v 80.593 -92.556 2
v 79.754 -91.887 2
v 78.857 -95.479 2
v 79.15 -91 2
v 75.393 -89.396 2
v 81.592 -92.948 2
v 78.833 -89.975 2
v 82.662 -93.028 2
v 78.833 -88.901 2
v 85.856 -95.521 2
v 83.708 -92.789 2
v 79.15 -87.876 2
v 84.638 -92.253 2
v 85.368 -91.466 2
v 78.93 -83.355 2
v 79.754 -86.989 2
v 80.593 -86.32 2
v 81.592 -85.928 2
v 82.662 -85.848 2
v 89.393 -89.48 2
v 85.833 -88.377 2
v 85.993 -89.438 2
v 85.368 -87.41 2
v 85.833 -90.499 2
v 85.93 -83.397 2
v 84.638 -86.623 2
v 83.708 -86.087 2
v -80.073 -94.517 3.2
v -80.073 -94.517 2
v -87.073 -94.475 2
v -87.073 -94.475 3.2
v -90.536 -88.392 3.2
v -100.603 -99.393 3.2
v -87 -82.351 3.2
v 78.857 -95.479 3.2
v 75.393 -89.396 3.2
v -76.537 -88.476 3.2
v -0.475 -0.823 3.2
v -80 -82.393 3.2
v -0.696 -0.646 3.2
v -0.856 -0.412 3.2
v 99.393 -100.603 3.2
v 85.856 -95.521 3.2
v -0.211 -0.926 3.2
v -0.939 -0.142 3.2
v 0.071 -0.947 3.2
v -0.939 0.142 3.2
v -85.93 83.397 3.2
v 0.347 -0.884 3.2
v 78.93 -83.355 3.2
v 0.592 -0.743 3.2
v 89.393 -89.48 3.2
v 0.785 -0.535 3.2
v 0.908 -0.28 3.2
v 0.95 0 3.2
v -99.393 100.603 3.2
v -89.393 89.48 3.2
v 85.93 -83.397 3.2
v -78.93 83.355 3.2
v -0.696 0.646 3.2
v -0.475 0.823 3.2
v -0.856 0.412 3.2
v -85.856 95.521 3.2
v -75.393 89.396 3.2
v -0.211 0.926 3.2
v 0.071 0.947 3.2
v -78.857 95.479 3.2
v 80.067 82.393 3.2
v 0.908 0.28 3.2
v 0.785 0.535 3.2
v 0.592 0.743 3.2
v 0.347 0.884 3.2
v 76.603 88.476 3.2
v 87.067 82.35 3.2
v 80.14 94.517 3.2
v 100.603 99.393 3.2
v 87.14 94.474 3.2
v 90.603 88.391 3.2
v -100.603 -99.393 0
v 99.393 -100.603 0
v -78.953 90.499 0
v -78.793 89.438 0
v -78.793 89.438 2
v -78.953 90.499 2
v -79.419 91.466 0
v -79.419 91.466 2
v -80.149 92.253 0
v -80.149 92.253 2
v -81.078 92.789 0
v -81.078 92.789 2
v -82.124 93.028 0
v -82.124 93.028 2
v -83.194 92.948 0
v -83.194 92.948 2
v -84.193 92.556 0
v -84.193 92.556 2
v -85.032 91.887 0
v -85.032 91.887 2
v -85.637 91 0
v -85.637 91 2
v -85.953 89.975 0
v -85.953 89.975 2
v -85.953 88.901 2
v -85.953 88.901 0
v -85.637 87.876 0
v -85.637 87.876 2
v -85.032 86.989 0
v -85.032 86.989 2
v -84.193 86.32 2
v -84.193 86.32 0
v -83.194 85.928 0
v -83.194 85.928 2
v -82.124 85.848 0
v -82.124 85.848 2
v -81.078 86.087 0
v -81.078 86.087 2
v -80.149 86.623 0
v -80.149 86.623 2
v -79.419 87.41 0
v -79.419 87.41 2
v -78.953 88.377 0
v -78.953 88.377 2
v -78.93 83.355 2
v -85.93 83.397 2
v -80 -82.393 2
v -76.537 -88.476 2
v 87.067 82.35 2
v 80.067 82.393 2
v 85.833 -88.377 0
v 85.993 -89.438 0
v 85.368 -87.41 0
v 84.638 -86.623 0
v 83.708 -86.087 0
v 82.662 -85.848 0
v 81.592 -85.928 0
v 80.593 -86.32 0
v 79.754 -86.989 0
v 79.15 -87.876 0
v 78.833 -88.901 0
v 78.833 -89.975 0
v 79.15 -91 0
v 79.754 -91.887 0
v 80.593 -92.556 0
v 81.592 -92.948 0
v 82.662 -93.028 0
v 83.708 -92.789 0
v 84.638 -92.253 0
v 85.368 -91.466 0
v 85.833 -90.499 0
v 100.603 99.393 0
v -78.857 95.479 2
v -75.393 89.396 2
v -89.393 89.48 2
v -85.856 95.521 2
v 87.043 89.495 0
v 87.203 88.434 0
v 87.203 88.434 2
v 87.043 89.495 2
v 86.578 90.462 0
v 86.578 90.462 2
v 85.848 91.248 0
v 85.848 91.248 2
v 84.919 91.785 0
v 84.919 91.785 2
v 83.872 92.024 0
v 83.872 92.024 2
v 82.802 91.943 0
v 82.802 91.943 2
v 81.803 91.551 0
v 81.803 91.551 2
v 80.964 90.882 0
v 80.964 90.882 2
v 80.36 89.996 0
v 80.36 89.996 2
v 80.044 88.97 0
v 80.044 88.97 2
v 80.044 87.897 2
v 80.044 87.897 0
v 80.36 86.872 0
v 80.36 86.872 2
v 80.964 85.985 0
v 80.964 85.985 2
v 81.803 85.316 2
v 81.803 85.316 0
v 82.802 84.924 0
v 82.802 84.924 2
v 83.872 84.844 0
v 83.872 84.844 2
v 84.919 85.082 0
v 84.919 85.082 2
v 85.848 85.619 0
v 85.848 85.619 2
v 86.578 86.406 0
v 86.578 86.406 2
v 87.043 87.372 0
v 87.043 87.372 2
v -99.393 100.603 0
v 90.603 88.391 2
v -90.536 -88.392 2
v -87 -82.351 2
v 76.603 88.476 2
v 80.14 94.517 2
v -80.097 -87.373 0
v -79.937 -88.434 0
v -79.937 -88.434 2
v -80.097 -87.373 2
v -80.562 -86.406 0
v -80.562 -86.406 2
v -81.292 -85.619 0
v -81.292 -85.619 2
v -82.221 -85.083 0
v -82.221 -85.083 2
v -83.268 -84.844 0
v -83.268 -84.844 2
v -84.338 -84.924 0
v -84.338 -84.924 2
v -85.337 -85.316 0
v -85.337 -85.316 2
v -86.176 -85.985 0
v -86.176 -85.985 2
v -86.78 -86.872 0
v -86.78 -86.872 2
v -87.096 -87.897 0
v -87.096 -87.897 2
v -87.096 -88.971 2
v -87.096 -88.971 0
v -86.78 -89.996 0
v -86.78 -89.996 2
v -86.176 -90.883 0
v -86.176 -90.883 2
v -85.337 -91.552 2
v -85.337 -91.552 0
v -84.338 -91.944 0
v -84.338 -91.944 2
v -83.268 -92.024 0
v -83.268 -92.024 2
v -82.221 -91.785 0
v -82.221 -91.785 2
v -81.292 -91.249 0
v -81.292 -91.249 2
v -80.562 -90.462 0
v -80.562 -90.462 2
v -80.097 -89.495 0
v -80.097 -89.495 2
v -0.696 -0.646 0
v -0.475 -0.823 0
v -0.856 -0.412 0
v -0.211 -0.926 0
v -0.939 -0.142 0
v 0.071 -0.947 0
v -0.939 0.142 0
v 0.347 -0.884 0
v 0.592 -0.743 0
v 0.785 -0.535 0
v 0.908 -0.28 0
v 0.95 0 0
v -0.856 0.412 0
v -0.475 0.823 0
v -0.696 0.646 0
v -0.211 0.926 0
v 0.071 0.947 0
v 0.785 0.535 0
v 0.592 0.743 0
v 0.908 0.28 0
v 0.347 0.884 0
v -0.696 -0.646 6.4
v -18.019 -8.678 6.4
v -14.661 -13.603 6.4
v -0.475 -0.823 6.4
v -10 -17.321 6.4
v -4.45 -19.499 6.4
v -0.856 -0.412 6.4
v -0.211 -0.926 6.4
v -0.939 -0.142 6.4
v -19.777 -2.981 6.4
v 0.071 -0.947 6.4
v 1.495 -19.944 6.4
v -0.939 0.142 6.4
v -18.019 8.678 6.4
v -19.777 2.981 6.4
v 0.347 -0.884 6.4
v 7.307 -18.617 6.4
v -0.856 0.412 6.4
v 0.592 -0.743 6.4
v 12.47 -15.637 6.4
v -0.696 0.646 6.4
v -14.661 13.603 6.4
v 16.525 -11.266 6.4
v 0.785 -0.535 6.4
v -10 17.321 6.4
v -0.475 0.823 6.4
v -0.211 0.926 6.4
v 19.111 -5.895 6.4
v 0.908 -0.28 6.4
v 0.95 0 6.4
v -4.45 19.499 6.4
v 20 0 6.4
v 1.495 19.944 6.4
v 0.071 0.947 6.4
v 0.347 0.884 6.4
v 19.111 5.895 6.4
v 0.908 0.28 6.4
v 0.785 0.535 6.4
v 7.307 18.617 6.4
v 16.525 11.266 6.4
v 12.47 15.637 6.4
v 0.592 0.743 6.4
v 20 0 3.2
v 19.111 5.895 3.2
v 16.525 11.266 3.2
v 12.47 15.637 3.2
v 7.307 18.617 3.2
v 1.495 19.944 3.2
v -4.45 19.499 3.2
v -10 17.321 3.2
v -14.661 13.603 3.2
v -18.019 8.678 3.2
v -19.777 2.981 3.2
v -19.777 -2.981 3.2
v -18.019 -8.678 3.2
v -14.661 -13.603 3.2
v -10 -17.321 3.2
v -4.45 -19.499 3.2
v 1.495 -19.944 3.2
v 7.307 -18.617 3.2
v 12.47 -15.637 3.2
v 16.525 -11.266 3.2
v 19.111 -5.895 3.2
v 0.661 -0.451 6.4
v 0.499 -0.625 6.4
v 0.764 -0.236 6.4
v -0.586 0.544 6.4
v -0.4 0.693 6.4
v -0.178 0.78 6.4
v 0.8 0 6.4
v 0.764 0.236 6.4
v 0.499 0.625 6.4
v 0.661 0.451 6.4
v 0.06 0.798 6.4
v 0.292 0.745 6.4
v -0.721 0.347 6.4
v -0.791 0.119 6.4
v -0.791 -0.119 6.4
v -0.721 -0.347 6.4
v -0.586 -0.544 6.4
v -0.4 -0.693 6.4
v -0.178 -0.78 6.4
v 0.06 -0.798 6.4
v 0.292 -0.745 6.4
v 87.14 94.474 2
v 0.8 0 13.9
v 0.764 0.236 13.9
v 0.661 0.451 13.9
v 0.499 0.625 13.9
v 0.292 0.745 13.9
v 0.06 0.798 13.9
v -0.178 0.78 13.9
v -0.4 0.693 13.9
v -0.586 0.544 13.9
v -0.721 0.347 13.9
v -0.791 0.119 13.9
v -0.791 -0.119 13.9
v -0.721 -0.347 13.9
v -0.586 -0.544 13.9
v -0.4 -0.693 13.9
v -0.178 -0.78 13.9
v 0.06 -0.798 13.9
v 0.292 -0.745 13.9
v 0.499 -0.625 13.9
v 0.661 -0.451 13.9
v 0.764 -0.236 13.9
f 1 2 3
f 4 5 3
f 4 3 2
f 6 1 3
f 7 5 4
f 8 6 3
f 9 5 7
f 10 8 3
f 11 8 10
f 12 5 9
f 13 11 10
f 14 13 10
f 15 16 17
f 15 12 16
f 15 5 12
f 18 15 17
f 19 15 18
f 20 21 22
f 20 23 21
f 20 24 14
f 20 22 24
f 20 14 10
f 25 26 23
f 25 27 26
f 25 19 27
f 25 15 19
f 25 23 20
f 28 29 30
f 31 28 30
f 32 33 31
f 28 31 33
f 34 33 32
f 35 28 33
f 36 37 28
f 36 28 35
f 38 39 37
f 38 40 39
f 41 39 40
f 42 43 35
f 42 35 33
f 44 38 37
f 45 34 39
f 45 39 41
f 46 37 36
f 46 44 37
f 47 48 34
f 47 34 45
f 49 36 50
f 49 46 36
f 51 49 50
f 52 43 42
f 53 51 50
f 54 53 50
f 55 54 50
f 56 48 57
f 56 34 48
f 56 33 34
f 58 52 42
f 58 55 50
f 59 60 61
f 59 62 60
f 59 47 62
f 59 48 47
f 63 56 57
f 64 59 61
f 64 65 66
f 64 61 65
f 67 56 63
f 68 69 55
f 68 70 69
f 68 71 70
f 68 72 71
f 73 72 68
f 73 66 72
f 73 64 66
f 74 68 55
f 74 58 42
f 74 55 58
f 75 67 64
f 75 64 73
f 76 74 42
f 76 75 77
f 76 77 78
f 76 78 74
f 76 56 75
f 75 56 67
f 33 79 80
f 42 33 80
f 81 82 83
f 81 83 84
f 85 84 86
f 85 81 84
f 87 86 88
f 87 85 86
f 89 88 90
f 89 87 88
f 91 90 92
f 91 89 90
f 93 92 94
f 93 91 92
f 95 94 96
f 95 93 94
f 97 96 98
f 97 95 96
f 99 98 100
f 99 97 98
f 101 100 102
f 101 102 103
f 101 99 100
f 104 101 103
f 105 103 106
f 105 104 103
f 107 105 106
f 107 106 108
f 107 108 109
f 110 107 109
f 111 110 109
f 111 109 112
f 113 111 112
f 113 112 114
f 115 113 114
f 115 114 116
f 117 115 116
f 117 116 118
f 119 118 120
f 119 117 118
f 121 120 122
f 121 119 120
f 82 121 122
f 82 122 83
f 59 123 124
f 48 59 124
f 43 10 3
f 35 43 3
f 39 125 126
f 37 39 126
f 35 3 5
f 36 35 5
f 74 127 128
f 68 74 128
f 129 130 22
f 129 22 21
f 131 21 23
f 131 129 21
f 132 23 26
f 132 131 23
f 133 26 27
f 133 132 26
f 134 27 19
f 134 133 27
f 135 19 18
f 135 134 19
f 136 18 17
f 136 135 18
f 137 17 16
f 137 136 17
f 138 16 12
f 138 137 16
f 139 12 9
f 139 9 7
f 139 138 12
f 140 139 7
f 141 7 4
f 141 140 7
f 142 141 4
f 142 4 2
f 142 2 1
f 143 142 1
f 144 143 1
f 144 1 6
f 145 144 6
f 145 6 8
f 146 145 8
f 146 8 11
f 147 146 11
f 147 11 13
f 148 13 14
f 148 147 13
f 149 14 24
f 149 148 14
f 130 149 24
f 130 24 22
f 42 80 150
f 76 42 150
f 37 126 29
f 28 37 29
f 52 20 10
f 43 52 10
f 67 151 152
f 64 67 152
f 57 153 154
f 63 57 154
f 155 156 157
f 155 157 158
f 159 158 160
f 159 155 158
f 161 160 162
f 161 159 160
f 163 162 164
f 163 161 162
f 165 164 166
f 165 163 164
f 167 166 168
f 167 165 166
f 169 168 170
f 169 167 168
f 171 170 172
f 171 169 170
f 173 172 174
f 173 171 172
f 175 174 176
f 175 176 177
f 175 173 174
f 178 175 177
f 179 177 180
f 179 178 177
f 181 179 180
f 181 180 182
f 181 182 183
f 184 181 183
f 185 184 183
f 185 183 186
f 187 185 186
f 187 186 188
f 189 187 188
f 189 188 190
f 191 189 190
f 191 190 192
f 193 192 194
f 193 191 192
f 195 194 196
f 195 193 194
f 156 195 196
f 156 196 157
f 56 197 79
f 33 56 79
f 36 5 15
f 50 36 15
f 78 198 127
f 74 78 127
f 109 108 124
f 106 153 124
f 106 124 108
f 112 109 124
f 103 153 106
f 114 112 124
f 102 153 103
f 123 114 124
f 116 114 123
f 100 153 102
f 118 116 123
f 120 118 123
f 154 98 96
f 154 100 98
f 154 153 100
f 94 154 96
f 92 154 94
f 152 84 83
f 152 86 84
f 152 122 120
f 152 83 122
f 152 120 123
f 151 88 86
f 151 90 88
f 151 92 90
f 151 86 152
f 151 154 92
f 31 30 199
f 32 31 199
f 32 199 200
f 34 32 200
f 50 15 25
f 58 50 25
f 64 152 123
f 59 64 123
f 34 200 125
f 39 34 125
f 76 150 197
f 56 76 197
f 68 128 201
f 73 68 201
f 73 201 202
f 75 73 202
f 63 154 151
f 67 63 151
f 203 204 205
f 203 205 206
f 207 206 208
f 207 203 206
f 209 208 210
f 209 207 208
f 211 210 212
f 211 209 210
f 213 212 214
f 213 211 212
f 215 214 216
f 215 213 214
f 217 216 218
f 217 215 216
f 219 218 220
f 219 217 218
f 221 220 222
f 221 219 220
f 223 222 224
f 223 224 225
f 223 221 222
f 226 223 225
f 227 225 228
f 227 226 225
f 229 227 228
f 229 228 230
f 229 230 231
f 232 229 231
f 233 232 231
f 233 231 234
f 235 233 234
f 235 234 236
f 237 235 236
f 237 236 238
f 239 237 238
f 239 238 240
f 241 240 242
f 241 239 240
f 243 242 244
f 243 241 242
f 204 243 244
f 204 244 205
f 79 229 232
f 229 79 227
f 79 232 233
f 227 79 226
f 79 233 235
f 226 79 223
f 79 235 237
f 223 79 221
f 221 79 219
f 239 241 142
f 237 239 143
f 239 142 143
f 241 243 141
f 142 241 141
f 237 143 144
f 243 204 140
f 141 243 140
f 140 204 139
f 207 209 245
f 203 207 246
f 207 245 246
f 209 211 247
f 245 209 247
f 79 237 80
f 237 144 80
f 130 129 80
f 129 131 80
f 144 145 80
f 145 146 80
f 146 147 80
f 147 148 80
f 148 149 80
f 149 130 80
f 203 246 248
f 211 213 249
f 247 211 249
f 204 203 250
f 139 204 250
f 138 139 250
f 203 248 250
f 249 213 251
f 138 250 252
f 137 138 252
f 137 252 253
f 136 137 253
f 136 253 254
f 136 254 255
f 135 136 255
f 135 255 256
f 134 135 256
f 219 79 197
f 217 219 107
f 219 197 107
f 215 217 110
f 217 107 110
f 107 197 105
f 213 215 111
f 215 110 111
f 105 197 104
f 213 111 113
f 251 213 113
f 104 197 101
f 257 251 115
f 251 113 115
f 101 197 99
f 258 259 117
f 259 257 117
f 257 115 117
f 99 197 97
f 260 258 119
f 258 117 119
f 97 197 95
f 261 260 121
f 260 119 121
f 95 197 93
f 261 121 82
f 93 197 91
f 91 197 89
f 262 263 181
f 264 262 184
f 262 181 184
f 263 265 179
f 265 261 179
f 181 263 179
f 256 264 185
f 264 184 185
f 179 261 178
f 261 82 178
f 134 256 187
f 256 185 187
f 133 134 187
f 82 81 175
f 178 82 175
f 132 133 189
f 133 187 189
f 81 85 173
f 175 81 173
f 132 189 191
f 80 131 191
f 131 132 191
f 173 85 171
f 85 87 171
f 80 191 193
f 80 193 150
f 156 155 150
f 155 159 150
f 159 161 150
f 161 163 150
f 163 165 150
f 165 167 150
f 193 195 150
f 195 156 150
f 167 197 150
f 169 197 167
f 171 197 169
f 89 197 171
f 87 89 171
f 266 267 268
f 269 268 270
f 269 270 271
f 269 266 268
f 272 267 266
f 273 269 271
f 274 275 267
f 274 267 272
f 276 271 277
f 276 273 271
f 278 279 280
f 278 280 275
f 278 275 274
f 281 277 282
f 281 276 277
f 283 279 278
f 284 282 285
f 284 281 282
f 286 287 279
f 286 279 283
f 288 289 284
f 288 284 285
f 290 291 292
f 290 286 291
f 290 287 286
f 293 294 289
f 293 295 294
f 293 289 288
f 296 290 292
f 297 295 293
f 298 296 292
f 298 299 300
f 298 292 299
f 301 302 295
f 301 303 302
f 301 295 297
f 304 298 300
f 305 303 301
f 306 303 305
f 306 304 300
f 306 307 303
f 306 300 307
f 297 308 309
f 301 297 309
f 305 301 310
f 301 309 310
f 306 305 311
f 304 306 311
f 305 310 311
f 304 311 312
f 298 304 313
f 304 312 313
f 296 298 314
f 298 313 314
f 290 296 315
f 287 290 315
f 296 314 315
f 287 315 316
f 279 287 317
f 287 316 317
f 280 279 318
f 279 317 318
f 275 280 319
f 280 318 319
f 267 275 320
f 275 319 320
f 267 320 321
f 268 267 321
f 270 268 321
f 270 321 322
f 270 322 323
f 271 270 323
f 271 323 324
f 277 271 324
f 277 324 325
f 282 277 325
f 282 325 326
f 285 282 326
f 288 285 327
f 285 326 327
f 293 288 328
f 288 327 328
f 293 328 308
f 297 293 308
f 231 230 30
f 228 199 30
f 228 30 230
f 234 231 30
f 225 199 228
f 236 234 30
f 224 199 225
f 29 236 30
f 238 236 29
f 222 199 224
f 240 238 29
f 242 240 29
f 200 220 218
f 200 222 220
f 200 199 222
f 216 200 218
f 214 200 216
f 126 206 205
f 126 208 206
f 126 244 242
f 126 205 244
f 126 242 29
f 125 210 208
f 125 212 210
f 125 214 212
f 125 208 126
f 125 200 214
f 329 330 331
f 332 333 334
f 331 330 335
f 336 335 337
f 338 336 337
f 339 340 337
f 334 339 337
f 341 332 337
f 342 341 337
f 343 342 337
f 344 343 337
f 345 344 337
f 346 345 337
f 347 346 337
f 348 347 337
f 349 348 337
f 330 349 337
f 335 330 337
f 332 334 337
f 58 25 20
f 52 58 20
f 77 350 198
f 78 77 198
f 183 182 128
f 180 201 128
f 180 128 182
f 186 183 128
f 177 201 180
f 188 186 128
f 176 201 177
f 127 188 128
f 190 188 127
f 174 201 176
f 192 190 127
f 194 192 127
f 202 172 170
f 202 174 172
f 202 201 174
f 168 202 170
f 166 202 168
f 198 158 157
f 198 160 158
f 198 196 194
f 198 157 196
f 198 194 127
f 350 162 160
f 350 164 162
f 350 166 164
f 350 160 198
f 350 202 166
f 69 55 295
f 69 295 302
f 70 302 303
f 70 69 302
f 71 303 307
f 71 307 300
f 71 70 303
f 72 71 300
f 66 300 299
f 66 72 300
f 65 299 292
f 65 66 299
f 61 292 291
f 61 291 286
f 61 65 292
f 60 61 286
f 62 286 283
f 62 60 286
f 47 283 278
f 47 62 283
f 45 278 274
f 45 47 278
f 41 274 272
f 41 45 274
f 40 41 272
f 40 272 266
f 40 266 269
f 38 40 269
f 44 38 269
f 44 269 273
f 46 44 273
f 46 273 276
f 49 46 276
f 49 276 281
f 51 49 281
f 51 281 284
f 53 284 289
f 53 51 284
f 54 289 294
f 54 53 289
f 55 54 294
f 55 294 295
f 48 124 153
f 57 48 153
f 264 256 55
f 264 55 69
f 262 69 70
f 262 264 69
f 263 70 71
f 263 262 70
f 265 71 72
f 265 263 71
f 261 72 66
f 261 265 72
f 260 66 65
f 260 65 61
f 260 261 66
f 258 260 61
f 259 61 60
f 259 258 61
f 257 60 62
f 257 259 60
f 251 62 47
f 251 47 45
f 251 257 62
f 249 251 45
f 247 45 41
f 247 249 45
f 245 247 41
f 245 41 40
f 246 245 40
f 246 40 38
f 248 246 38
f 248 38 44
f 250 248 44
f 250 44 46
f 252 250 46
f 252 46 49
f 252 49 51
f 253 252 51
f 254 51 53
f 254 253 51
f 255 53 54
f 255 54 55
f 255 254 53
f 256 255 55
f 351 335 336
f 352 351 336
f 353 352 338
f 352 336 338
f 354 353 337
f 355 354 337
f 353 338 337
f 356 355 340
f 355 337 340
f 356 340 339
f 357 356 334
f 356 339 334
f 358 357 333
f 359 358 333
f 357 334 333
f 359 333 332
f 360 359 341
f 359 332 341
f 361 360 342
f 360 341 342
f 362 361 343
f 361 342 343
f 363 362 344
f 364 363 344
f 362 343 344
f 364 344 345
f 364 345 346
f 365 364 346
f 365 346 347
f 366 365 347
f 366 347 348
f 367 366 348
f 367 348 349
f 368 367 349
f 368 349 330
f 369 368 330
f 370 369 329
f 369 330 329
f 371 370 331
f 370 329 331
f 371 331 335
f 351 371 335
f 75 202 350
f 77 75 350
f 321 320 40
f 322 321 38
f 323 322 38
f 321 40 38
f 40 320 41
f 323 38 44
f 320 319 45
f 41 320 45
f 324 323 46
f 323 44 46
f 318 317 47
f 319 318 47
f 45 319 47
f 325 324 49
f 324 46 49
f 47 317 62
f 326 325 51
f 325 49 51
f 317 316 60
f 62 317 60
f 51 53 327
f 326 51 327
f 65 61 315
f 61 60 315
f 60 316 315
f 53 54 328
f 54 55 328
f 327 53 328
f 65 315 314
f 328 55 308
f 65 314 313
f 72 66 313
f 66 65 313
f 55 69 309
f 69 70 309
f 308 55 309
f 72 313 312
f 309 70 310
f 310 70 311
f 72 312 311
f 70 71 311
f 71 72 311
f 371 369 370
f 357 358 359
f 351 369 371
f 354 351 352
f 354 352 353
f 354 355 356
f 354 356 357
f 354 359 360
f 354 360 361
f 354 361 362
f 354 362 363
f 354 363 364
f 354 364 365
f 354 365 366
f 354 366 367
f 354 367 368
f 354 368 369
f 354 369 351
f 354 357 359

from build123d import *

# Parameters (mm, degrees)
F0_R     = 0.95
F1_DEPTH = 3.2
F0_R_2   = 3.6
F2_DEPTH = 2
F3_R     = 20
F3_R_2   = 0.95
F4_DEPTH = 3.2
F5_R     = 0.8
F6_DEPTH = 7.5


with BuildPart() as f1:
    # F0 (on Top) → F1 (new body)
    with BuildSketch(Plane.XY):
        Polygon((100.603239, 99.3931), (-99.3931, 100.603239), (-100.603239, -99.3931), (99.3931, -100.603239), align=None)
        Polygon((-87.073233, -94.474876), (-90.536488, -88.391632), (-86.999872, -82.350742), (-80, -82.393097), (-76.536744, -88.476341), (-80.073361, -94.517231), align=None, mode=Mode.SUBTRACT)
        Circle(F0_R, mode=Mode.SUBTRACT)
        Polygon((85.929844, -83.397106), (89.3931, -89.480351), (85.856484, -95.52124), (78.856612, -95.478885), (75.393356, -89.395641), (78.929972, -83.354751), align=None, mode=Mode.SUBTRACT)
        Polygon((-78.856612, 95.478885), (-75.393356, 89.395641), (-78.929972, 83.354751), (-85.929844, 83.397106), (-89.3931, 89.480351), (-85.856484, 95.52124), align=None, mode=Mode.SUBTRACT)
        Polygon((87.139983, 94.474472), (90.603239, 88.391228), (87.066623, 82.350338), (80.066751, 82.392693), (76.603495, 88.475937), (80.140112, 94.516827), align=None, mode=Mode.SUBTRACT)
    extrude(amount=F1_DEPTH)

    # F0 (on Top) → F2 (join)
    with BuildSketch(Plane.XY):
        Polygon((-86.999872, -82.350742), (-90.536488, -88.391632), (-87.073233, -94.474876), (-80.073361, -94.517231), (-76.536744, -88.476341), (-80, -82.393097), align=None)
        with Locations((-83.536616, -88.433986)):
            Circle(F0_R_2, mode=Mode.SUBTRACT)
        Polygon((-78.929972, 83.354751), (-75.393356, 89.395641), (-78.856612, 95.478885), (-85.856484, 95.52124), (-89.3931, 89.480351), (-85.929844, 83.397106), align=None)
        with Locations((-82.393228, 89.437996)):
            Circle(F0_R_2, mode=Mode.SUBTRACT)
        Polygon((85.856484, -95.52124), (89.3931, -89.480351), (85.929844, -83.397106), (78.929972, -83.354751), (75.393356, -89.395641), (78.856612, -95.478885), align=None)
        with Locations((82.393228, -89.437996)):
            Circle(F0_R_2, mode=Mode.SUBTRACT)
        Polygon((87.066623, 82.350338), (90.603239, 88.391228), (87.139983, 94.474472), (80.140112, 94.516827), (76.603495, 88.475937), (80.066751, 82.392693), align=None)
        with Locations((83.603367, 88.433582)):
            Circle(F0_R_2, mode=Mode.SUBTRACT)
    extrude(amount=F2_DEPTH)


with BuildPart() as f4:
    # F3 (on face) → F4 (new body)
    with BuildSketch(Plane.XY.offset(3.2)):
        Circle(F3_R)
        Circle(F3_R_2, mode=Mode.SUBTRACT)
    extrude(amount=F4_DEPTH)


with BuildPart() as f6:
    # F5 (on face) → F6 (new body)
    with BuildSketch(Plane.XY.offset(6.4)):
        Circle(F5_R)
    extrude(amount=F6_DEPTH)


solid = Compound([f1.part, f4.part, f6.part])
